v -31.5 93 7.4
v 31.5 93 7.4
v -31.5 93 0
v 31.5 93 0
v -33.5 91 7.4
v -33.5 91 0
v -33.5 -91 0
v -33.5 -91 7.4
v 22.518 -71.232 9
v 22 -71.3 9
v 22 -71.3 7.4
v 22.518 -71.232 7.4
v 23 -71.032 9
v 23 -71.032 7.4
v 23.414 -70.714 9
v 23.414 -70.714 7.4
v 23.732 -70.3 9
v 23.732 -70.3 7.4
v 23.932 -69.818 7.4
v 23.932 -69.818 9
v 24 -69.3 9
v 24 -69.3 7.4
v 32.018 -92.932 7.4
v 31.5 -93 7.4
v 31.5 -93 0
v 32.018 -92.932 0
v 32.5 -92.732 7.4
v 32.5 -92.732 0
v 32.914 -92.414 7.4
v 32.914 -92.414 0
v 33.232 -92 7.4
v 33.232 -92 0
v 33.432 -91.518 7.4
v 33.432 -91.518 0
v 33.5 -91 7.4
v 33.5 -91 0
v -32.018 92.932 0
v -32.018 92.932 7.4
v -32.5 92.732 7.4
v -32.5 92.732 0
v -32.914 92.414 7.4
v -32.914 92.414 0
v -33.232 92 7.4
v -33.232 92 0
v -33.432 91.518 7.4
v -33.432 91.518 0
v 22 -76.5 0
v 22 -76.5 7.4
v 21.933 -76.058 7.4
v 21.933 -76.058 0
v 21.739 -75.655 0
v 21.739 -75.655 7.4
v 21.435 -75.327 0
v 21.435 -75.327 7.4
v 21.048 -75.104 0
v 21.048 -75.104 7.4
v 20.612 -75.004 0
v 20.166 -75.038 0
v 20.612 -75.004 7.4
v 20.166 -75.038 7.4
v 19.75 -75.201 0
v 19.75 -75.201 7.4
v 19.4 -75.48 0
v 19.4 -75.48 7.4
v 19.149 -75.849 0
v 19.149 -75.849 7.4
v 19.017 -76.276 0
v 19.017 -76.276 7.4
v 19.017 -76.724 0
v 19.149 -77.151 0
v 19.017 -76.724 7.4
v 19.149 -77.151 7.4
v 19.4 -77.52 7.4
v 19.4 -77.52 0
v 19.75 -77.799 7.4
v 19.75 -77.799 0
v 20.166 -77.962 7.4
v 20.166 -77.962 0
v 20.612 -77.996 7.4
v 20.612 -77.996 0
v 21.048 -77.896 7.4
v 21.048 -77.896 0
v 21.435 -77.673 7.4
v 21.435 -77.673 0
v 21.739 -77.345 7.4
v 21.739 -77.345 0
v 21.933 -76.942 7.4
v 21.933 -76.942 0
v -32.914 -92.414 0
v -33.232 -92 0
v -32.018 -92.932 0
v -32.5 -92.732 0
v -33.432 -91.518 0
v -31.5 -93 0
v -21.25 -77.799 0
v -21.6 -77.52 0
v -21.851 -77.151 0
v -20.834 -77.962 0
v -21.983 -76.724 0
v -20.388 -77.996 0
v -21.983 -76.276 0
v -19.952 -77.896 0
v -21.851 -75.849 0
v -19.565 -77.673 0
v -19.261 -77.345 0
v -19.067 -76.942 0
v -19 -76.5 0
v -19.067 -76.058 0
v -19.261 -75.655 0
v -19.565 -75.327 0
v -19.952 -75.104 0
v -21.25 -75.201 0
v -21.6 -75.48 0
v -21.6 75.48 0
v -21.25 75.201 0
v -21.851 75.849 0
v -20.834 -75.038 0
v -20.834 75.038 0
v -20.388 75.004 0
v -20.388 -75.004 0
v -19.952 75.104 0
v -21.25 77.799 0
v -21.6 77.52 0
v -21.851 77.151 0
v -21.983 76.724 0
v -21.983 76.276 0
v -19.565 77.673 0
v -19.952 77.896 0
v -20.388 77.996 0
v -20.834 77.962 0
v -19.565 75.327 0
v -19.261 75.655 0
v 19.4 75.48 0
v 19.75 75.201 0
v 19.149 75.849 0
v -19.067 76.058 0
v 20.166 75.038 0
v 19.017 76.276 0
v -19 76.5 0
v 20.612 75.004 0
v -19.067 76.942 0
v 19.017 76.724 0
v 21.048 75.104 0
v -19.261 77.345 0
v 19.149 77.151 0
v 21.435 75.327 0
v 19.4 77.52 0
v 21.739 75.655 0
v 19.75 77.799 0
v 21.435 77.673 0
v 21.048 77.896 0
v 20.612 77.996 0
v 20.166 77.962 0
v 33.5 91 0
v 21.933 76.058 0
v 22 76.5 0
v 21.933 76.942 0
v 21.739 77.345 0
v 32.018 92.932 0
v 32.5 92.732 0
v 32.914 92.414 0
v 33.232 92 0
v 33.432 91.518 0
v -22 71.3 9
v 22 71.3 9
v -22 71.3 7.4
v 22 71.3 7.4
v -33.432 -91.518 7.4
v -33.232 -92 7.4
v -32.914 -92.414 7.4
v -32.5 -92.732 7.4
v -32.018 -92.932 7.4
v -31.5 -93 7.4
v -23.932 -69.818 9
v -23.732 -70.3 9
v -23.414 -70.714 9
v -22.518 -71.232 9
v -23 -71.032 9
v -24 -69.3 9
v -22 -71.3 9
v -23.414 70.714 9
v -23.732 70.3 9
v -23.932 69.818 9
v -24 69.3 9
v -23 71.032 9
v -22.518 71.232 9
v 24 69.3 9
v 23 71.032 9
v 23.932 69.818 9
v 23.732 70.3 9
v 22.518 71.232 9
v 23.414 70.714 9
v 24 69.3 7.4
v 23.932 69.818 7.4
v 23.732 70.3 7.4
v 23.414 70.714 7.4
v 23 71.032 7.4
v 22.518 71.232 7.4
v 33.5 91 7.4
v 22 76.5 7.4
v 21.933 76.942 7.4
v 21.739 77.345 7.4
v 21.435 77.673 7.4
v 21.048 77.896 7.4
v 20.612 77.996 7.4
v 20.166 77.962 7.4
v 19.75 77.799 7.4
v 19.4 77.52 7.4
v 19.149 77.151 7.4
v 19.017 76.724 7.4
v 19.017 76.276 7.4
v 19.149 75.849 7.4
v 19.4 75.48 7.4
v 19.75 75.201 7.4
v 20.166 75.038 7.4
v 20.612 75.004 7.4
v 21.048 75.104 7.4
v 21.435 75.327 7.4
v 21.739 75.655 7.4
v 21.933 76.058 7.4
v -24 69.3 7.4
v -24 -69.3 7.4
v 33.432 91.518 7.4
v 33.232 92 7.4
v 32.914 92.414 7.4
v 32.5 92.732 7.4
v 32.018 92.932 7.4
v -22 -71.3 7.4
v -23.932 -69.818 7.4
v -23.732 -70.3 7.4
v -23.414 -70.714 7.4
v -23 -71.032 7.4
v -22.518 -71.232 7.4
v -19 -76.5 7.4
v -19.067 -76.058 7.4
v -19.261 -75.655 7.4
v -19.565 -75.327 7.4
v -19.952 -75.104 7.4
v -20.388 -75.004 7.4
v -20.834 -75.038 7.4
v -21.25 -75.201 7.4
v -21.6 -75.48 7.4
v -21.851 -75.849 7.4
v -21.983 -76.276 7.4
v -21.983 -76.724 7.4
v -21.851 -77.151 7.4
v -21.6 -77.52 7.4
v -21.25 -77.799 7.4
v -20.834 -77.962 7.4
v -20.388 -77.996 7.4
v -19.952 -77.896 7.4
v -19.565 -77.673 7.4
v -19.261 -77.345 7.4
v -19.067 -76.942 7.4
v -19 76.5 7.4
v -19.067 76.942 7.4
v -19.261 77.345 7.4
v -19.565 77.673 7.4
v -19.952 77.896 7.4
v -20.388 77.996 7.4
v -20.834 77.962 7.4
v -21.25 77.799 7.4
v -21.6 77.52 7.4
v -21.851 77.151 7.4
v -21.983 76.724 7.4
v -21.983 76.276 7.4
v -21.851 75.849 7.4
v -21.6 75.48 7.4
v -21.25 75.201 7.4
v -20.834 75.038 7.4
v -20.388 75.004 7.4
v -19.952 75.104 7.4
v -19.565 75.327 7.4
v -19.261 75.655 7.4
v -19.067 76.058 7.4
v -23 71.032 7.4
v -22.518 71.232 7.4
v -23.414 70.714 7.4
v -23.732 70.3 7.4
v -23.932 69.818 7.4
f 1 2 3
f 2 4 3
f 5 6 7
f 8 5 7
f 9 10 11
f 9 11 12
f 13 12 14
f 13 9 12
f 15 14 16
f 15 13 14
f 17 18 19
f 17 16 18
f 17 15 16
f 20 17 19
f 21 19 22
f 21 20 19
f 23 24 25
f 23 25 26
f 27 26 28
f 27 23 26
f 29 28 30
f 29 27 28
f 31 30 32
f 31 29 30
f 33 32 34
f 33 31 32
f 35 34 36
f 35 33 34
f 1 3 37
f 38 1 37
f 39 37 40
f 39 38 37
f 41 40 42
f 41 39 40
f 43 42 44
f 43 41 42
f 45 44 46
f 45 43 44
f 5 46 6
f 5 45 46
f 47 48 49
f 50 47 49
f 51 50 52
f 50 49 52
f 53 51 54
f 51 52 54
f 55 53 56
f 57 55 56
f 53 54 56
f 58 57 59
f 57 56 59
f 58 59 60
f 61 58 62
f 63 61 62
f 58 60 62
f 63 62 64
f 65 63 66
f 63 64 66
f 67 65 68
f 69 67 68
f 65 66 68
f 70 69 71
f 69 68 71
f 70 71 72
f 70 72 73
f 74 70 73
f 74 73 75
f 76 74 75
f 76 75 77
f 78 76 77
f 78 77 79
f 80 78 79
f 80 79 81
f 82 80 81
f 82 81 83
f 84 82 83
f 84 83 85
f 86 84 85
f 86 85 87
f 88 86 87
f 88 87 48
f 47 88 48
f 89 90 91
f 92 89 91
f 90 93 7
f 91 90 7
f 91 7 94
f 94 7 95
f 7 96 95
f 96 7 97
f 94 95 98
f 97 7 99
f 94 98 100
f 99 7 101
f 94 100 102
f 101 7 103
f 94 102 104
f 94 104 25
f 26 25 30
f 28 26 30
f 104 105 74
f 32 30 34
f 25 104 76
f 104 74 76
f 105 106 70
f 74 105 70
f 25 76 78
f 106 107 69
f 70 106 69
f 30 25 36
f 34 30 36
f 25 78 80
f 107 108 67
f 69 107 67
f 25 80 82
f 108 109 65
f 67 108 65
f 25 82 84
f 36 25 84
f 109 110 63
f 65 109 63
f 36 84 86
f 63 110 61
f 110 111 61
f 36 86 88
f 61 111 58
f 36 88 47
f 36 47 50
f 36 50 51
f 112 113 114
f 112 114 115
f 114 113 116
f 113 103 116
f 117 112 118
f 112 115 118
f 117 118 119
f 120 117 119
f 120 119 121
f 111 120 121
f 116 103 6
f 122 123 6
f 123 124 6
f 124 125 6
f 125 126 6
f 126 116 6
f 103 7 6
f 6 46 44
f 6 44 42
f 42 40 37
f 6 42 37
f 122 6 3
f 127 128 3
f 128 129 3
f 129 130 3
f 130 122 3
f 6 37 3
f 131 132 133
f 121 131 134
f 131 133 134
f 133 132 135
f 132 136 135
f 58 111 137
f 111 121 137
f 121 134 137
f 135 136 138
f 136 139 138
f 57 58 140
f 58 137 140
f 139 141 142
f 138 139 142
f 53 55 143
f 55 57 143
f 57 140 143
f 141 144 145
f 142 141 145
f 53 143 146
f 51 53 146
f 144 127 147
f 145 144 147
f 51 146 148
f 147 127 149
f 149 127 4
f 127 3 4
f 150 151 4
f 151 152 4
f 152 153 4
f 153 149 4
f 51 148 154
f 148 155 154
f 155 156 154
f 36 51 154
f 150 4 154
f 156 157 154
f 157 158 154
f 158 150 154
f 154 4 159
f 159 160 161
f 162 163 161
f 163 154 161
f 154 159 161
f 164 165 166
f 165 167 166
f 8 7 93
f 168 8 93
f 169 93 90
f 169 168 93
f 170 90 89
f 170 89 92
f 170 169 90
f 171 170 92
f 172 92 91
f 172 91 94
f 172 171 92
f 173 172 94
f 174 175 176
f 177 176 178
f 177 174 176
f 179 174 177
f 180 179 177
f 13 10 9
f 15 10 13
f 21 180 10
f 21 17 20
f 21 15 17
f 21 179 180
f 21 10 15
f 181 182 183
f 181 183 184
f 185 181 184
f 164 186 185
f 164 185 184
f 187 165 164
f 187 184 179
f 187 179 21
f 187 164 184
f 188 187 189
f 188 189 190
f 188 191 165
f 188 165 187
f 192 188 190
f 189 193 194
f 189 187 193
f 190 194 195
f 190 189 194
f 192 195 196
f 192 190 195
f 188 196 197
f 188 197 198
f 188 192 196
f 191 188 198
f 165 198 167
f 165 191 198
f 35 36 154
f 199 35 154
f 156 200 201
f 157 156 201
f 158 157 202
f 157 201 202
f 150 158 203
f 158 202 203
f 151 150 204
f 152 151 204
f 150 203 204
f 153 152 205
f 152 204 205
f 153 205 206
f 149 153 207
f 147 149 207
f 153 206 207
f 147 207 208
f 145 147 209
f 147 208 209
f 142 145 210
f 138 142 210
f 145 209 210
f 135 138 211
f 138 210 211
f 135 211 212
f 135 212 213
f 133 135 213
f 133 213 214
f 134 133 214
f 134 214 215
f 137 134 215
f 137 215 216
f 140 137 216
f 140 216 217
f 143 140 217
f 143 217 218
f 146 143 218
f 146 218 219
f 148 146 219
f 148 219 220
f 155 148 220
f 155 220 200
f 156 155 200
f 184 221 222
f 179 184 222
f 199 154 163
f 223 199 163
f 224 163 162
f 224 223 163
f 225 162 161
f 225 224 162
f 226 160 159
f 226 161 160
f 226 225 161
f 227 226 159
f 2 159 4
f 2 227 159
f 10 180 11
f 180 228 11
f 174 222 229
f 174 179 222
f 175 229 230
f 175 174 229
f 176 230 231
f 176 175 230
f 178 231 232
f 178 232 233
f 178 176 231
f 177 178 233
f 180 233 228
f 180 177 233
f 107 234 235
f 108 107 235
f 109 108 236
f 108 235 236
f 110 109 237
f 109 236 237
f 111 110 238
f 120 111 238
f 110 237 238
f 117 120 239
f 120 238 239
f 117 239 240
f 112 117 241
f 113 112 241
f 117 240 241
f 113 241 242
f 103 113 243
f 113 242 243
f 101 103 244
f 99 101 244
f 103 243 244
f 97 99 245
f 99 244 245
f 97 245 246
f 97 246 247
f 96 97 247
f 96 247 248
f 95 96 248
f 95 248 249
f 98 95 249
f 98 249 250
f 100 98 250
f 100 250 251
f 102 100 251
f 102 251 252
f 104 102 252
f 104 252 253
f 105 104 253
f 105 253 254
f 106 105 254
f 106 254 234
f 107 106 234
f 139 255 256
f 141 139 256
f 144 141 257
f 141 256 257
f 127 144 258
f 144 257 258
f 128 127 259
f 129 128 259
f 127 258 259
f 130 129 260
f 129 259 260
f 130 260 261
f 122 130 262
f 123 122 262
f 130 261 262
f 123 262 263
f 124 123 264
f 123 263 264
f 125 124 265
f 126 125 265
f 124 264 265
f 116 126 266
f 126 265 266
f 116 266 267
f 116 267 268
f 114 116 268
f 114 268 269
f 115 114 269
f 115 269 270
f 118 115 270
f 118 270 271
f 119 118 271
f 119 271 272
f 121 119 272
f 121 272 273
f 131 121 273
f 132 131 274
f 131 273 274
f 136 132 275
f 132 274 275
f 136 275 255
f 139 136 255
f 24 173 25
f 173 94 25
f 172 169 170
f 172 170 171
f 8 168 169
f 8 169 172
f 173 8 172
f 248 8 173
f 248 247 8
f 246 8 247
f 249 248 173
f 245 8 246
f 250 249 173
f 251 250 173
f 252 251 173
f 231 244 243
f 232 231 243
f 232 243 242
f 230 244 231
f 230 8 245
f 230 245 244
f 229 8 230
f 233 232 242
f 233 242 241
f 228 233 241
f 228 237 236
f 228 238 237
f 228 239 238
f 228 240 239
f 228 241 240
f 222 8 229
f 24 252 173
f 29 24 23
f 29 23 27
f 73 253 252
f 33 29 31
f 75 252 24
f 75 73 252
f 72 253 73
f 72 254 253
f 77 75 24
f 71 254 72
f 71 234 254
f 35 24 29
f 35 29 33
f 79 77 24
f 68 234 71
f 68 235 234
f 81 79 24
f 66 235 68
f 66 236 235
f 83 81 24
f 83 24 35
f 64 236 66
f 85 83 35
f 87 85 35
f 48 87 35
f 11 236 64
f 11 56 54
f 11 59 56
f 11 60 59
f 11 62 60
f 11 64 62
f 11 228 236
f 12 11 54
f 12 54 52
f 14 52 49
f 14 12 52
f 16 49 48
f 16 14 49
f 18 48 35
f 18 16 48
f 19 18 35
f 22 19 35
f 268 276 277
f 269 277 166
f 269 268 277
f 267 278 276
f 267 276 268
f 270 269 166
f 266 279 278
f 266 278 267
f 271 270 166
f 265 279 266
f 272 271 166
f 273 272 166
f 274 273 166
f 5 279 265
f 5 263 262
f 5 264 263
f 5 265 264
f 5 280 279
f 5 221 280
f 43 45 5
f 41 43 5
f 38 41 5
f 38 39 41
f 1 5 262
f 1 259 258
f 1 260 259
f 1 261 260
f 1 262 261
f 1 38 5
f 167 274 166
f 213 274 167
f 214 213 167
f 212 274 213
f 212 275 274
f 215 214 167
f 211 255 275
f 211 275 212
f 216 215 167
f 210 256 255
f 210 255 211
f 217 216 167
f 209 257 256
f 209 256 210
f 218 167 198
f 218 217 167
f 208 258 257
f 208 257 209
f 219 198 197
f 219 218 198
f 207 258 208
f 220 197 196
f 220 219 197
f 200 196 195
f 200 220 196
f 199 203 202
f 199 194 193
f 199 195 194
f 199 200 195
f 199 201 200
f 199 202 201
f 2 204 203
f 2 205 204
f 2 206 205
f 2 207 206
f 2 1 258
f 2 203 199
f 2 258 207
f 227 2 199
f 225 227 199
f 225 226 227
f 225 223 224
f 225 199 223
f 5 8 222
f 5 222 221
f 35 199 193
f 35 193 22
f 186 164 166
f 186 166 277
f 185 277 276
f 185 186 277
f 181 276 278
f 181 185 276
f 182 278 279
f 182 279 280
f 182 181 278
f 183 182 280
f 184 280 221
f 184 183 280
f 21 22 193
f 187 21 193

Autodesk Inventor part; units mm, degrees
ref_plane "YZ Plane" through (0, 0, 0) normal (1, 0, 0) x (0, 1, 0)
ref_plane "XZ Plane" through (0, 0, 0) normal (0, 1, 0) x (-1, 0, 0)
ref_plane "XY Plane" through (0, 0, 0) normal (0, 0, 1) x (1, 0, 0)
sketch "Sketch1" plane through (0, 0, 0) normal (0, 0, 1) x (1, 0, 0)
  line L0 (-33.5, -93) -> (33.5, -93)
  line L1 (33.5, -93) -> (33.5, 93)
  line L2 (33.5, 93) -> (-33.5, 93)
  line L3 (-33.5, 93) -> (-33.5, -93)
  line L4 (-33.5, -93) -> (33.5, 93) construction
  line L5 (33.5, -93) -> (-33.5, 93) construction
  point P0 (0, 0)
  dimension "d0" = 67
  dimension "d1" = 186
extrude "Extrusion1" add sketch "Sketch1" along normal blind 7.4
sketch "Sketch2" plane through (0, 0, 7.4) normal (0, 0, 1) x (1, 0, 0)
  line L0 (24, 71.3) -> (-24, 71.3)
  line L1 (-24, 71.3) -> (-24, -71.3)
  line L2 (-24, -71.3) -> (24, -71.3)
  line L3 (24, -71.3) -> (24, 71.3)
  line L4 (24, 71.3) -> (-24, -71.3) construction
  line L5 (-24, 71.3) -> (24, -71.3) construction
  point P0 (0, 0)
  dimension "d4" = 48
  dimension "d5" = 142.6
extrude "Extrusion2" add sketch "Sketch2" along normal blind 1.6
fillet "Fillet1" radius 2 8 edges at (24, 71.3, 8.2) (-24, 71.3, 8.2) (-24, -71.3, 8.2) (24, -71.3, 8.2) (-33.5, 93, 3.7) (33.5, 93, 3.7) (-33.5, -93, 3.7) (33.5, -93, 3.7)
sketch "Sketch3" plane through (0, 0, 9) normal (0, 0, 1) x (1, 0, 0)
  circle A0 centre (-20.5, -76.5) radius 1.5
  line L0 (-46.9, 0) -> (46.9, 0) construction
  line L1 (0, -130.2) -> (0, 130.2) construction
  circle A1 centre (-20.5, 76.5) radius 1.5
  circle A2 centre (20.5, -76.5) radius 1.5
  circle A3 centre (20.5, 76.5) radius 1.5
  point P0 (0, 0)
  dimension "d9" = 3
  dimension "d10" = 41
  dimension "d11" = 153
extrude "Extrusion3" cut sketch "Sketch3" against normal through all
properties part number "PanelJig"
